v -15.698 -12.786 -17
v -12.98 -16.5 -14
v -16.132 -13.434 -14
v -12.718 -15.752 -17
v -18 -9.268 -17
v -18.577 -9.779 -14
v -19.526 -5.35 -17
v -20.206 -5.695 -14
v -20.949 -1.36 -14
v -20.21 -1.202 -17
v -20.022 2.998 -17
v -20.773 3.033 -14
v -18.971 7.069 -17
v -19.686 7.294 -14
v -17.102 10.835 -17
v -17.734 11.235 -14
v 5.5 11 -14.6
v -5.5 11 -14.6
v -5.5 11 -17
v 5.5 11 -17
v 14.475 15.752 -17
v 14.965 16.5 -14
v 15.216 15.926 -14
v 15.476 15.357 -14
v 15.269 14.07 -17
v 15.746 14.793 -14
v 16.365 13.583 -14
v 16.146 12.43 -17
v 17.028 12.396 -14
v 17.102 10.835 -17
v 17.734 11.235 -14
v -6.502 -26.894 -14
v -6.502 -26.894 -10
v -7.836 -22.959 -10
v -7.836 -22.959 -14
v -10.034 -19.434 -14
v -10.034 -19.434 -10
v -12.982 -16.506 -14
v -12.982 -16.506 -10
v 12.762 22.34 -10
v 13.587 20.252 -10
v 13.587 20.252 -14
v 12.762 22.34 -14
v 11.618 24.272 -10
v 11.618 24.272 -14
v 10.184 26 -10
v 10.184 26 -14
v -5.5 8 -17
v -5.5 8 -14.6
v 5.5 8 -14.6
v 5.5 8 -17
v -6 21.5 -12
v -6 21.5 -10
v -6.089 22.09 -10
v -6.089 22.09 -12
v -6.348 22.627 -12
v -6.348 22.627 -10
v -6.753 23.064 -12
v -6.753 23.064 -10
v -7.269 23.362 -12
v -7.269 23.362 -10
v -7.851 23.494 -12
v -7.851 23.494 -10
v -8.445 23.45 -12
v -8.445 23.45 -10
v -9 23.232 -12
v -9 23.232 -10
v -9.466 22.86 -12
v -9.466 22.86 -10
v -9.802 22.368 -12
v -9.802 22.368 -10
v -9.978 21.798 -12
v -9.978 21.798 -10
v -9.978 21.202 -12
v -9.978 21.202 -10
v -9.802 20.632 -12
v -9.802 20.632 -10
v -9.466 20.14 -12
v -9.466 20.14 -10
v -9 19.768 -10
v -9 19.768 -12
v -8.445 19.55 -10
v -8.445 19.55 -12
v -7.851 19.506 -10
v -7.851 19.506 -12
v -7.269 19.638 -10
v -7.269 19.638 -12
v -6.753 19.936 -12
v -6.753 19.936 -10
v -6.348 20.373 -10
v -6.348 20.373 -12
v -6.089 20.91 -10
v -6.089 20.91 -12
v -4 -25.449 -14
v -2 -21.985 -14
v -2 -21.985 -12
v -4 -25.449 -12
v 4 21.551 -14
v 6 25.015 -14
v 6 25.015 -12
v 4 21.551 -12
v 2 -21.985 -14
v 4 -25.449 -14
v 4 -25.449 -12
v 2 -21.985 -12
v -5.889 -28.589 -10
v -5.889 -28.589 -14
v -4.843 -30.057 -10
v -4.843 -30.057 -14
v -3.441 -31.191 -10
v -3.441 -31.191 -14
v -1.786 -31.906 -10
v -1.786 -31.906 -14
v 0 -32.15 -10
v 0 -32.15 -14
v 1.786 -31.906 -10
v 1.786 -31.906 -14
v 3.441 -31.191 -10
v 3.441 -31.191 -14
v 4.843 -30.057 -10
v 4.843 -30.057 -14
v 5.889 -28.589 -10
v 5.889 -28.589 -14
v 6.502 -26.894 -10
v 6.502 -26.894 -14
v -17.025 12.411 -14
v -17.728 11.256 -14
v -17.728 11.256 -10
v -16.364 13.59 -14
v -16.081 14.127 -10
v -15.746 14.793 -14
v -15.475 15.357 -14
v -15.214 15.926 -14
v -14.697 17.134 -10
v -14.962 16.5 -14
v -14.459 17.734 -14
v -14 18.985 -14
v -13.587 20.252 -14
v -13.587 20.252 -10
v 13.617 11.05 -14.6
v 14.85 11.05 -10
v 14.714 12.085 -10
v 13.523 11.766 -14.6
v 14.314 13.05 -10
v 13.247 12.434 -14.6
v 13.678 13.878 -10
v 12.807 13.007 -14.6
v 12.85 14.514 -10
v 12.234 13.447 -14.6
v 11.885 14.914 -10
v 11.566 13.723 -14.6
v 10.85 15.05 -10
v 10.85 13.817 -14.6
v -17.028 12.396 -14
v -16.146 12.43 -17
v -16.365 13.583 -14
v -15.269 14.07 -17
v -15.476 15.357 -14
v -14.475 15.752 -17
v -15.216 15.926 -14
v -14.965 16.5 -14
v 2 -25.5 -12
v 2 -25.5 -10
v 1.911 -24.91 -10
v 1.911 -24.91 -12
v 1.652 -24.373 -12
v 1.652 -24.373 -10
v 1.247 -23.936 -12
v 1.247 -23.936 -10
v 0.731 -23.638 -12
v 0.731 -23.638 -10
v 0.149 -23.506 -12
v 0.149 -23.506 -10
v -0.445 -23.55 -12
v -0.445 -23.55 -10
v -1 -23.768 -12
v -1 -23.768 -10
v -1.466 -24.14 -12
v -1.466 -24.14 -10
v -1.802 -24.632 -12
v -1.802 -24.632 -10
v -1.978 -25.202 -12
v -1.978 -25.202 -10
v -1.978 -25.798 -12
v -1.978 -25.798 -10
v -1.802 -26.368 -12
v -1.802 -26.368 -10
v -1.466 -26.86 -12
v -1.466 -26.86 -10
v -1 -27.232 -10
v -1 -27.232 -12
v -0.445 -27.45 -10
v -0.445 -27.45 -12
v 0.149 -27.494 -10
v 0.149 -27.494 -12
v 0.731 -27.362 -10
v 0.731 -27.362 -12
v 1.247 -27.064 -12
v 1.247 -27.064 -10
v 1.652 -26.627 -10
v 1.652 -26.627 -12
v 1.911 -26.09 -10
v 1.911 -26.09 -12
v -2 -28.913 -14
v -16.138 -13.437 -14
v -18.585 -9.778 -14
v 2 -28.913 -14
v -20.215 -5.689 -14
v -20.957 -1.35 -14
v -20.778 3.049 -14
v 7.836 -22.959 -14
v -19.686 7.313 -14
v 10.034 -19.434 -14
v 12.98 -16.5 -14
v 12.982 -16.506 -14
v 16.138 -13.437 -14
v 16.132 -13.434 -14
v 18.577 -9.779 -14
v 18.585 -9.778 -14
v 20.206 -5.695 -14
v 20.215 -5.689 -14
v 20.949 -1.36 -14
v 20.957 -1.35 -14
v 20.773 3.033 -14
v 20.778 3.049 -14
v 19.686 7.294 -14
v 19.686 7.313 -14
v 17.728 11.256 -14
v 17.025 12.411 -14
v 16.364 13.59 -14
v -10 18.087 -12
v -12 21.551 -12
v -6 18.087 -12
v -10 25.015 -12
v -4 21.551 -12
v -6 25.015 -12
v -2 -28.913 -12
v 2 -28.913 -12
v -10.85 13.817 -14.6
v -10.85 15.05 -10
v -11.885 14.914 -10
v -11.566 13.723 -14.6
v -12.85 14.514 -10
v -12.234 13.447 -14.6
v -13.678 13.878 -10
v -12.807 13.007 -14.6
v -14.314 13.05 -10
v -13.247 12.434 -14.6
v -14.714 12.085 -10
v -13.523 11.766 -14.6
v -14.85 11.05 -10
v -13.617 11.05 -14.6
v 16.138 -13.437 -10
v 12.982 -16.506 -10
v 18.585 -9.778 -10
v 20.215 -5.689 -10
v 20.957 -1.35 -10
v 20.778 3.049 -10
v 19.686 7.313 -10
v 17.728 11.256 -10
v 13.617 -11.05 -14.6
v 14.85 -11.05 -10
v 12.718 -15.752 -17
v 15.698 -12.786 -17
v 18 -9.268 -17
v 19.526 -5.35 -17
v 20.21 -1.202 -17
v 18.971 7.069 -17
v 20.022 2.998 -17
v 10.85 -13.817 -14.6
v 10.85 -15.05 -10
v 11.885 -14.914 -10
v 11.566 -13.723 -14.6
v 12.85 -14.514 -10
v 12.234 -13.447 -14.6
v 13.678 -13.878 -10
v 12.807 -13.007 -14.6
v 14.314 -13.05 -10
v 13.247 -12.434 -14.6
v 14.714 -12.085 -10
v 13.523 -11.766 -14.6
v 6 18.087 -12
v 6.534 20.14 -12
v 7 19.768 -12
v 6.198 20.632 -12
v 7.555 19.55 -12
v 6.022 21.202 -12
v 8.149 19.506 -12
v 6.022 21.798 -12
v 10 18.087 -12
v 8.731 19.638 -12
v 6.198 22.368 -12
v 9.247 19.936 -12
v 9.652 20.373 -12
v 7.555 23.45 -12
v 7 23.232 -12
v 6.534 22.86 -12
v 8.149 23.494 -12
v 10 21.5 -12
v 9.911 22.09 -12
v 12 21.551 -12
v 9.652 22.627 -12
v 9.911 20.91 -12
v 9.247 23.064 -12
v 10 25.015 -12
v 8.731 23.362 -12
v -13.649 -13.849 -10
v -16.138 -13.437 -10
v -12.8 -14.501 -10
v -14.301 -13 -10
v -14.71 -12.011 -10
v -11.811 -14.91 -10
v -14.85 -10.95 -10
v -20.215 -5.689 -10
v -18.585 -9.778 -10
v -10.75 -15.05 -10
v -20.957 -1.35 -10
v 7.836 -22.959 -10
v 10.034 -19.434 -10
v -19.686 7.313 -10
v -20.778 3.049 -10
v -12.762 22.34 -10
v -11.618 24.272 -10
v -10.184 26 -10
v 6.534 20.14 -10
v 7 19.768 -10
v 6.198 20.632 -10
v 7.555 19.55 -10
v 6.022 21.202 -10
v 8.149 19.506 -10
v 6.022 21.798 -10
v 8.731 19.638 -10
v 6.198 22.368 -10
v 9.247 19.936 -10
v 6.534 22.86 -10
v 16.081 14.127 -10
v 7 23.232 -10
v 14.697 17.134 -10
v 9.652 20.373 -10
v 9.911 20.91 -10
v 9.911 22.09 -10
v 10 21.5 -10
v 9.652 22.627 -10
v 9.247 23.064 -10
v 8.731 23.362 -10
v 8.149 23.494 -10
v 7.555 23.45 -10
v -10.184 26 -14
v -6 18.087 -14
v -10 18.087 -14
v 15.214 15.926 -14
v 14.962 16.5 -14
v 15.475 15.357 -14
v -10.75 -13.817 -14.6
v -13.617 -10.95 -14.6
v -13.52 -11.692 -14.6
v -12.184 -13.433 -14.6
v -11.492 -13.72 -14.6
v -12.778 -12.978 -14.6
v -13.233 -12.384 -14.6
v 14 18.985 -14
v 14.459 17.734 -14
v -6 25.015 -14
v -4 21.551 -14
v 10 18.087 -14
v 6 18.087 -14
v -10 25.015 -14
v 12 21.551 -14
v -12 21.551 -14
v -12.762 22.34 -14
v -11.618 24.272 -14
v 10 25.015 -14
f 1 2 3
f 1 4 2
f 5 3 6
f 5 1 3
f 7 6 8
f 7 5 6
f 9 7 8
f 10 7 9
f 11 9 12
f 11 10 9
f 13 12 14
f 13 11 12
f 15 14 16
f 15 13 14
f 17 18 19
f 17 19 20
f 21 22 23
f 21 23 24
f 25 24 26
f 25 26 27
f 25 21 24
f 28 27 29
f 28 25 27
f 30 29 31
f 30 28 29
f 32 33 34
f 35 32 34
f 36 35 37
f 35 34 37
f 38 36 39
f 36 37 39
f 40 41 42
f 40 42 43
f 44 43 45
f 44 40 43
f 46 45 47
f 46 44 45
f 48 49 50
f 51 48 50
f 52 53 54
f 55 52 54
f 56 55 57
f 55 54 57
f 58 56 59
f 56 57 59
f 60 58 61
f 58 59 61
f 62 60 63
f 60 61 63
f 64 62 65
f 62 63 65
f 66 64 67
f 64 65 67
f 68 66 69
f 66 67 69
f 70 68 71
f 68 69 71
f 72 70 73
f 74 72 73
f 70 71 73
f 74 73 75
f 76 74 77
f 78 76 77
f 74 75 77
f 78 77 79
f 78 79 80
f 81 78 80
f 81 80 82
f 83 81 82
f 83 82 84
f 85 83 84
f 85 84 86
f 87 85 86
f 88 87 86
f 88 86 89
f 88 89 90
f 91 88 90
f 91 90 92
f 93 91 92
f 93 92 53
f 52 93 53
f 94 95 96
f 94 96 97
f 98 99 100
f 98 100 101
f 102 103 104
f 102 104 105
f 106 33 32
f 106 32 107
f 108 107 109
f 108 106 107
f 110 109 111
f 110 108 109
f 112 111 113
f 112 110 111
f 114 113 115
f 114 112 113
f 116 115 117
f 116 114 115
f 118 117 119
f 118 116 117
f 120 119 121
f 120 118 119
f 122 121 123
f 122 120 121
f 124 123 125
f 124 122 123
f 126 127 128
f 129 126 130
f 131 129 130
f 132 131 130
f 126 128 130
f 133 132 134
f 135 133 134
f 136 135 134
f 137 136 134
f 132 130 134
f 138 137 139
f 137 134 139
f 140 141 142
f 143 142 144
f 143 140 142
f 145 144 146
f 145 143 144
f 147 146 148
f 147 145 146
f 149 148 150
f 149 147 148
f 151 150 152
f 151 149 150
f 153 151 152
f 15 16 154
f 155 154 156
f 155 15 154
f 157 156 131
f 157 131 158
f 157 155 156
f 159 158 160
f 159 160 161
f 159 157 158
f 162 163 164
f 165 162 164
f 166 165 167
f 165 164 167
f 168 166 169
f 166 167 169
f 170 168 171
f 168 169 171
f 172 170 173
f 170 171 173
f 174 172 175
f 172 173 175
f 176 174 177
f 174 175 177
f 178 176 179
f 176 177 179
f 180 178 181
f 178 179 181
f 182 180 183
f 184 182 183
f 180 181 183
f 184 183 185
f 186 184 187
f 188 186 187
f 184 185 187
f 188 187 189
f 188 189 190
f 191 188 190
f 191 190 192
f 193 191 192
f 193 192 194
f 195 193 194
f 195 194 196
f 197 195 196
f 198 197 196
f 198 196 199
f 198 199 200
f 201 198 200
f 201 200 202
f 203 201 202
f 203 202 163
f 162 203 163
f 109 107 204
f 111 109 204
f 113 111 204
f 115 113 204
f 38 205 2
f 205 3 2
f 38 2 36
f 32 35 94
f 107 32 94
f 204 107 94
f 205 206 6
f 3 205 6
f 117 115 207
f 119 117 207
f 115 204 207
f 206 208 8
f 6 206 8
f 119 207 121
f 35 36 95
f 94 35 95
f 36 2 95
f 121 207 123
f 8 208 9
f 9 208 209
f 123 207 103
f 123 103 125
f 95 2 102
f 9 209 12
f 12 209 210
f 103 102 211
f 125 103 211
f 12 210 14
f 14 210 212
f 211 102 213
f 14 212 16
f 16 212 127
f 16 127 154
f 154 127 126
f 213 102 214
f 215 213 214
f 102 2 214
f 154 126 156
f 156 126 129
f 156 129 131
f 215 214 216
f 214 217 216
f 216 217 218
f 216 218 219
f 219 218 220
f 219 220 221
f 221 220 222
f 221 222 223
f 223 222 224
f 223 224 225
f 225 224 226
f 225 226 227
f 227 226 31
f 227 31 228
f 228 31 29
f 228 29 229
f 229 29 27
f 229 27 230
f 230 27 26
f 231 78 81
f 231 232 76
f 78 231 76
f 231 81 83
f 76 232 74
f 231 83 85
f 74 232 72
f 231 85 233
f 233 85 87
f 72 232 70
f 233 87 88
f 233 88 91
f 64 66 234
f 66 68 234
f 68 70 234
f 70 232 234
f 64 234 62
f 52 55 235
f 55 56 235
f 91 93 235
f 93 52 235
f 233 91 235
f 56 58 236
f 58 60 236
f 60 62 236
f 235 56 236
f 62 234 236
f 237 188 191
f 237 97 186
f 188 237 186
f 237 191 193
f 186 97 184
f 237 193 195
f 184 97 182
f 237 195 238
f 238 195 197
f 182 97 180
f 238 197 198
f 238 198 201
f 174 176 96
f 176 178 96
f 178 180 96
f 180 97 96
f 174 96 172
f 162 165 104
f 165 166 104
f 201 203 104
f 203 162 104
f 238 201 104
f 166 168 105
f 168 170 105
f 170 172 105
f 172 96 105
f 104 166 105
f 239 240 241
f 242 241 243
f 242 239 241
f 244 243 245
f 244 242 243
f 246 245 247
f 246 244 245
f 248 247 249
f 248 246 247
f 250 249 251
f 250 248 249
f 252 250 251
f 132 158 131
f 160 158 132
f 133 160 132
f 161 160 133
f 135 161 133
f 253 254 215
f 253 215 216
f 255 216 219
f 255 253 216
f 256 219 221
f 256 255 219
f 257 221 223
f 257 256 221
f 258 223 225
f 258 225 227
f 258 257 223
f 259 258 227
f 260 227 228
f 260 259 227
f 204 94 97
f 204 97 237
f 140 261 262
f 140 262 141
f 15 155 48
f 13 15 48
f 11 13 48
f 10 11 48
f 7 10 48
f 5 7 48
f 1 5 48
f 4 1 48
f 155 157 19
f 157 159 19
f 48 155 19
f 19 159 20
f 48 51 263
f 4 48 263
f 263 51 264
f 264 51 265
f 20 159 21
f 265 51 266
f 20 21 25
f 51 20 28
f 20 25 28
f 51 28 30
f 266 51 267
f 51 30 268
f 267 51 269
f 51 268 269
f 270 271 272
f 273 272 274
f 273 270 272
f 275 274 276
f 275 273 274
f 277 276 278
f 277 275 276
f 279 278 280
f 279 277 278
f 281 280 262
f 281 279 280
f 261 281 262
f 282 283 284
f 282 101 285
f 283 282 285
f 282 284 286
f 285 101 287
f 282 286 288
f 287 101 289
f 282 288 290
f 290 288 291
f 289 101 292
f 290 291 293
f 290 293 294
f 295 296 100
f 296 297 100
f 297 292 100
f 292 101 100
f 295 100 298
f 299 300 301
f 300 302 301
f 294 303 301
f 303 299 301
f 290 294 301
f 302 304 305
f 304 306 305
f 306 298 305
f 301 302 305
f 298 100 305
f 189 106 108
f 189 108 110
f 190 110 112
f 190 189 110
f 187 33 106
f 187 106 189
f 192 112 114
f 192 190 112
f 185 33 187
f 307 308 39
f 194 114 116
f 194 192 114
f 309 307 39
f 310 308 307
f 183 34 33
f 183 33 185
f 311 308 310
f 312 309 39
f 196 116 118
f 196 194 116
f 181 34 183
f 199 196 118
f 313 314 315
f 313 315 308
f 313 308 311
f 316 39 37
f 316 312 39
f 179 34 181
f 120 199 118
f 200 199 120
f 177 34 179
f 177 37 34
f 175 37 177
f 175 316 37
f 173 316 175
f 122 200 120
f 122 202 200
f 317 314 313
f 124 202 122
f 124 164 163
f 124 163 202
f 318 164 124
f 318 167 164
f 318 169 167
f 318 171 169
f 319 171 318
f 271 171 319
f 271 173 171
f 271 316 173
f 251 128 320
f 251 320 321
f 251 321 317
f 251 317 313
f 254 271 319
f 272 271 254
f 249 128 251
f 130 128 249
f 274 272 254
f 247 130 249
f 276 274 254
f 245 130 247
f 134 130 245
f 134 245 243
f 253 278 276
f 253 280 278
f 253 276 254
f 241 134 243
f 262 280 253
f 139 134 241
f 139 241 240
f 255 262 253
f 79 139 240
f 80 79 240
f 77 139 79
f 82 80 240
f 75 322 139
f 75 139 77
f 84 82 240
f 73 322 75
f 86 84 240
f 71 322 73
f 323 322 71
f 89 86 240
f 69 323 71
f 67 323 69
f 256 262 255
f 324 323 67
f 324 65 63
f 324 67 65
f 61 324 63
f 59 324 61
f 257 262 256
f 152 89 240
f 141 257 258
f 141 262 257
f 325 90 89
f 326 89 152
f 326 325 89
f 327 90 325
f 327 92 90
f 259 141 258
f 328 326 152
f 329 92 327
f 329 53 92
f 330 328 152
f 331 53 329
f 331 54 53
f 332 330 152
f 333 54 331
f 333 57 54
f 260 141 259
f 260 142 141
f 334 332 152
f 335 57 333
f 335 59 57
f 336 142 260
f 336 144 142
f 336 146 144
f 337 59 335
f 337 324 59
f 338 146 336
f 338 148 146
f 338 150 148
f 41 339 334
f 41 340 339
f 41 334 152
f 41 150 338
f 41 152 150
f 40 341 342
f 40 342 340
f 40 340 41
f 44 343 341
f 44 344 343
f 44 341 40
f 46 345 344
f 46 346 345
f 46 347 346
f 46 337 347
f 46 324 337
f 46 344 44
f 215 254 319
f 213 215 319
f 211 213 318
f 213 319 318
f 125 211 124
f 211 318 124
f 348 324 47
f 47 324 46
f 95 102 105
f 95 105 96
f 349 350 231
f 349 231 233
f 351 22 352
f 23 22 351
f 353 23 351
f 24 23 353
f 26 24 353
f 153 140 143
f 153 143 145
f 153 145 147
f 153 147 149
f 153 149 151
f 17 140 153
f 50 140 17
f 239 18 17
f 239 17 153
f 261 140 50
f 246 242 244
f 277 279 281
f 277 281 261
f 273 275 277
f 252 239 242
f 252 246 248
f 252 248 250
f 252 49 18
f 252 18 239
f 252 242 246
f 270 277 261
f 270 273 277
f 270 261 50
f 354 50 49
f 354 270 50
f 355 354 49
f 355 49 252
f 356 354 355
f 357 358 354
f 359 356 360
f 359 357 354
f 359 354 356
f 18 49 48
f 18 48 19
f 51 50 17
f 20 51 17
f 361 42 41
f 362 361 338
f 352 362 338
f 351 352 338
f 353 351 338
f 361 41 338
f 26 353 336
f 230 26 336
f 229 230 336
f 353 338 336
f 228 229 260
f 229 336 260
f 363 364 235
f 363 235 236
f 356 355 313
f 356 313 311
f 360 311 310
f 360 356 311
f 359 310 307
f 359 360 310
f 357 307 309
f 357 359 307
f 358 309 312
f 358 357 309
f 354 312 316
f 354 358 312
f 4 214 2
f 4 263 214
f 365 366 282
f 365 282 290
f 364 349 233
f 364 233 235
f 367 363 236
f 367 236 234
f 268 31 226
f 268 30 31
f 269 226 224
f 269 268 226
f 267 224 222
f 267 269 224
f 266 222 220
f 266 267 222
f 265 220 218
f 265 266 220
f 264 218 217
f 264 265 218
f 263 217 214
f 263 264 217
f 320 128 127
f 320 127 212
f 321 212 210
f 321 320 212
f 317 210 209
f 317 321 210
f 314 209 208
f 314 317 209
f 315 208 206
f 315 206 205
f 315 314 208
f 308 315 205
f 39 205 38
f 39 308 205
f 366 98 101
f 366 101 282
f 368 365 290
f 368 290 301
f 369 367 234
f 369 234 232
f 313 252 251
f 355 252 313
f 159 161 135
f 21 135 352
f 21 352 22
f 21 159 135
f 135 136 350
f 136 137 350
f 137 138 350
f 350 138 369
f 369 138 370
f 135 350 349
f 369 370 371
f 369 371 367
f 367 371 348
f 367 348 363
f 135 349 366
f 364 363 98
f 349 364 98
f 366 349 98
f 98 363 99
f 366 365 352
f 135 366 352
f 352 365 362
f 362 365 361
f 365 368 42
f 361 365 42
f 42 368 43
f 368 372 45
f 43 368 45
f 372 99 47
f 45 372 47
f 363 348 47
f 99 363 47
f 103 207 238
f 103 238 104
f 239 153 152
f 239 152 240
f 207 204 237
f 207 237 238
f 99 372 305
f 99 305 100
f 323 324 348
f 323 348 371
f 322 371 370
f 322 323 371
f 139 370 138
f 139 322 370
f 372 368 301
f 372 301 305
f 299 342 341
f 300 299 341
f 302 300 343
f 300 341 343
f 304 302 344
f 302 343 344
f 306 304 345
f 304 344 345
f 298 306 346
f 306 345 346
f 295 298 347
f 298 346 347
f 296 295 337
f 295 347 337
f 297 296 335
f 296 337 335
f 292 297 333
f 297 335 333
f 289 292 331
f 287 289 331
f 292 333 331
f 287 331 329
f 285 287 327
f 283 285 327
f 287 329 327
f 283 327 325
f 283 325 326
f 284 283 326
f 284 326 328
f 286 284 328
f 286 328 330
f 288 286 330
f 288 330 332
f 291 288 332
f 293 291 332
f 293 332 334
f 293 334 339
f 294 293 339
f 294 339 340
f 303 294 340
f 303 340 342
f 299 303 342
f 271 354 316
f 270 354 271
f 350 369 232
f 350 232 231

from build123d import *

# Parameters (mm, degrees)
PAD033_DEPTH    = 3
PAD033_TAPER    = 14
SKETCH057_R     = 2
PAD034_DEPTH    = 4
POCKET008_DEPTH = 4.6
POCKET008_TAPER = 15
POCKET009_DEPTH = 2
SKETCH056_W     = 11
SKETCH056_H     = 3
POCKET010_DEPTH = 5


with BuildPart() as part:
    # Sketch055 → Pad033 (new body)
    with BuildSketch(Plane.XY.offset(-4)):
        with BuildLine():
            ThreePointArc((-17.734351, 11.23491), (-16.243686, 13.811706), (-14.965, 16.5))
            Line((-14.965, 16.5), (14.965, 16.5))
            ThreePointArc((14.965, 16.5), (16.243686, 13.811706), (17.734351, 11.23491))
            ThreePointArc((12.98, -16.5), (20.691765, -3.547007), (17.734351, 11.23491))
            Line((-12.98, -16.5), (12.98, -16.5))
            ThreePointArc((-17.734351, 11.23491), (-20.691765, -3.547007), (-12.98, -16.5))
        make_face()
    extrude(amount=-PAD033_DEPTH, taper=PAD033_TAPER)

    # Sketch057 → Pad034 (join)
    with BuildSketch(Plane.XY):
        with BuildLine():
            ThreePointArc((13.586881, 20.251823), (12.228055, 23.328699), (10.184105, 26))
            Line((-10.184105, 26), (10.184105, 26))
            ThreePointArc((-10.184105, 26), (-12.228055, 23.328699), (-13.586881, 20.251823))
            ThreePointArc((-17.728491, 11.256137), (-15.355357, 15.614788), (-13.586881, 20.251823))
            ThreePointArc((-17.728491, 11.256137), (-20.699674, -3.538854), (-12.982142, -16.506483))
            ThreePointArc((-6.502297, -26.893782), (-8.833051, -21.132971), (-12.982142, -16.506483))
            ThreePointArc((-6.502297, -26.893782), (0, -32.15), (6.502297, -26.893782))
            ThreePointArc((12.982142, -16.506483), (8.833051, -21.132971), (6.502297, -26.893782))
            ThreePointArc((12.982142, -16.506483), (20.699674, -3.538854), (17.728491, 11.256137))
            ThreePointArc((13.586881, 20.251823), (15.355357, 15.614788), (17.728491, 11.256137))
        make_face()
        with Locations((0, -25.5)):
            Circle(SKETCH057_R, mode=Mode.SUBTRACT)
        with Locations((-8, 21.5)):
            Circle(SKETCH057_R, mode=Mode.SUBTRACT)
        with Locations((8, 21.5)):
            Circle(SKETCH057_R, mode=Mode.SUBTRACT)
    extrude(amount=-PAD034_DEPTH)

    # Sketch058 → Pocket008 (cut)
    with BuildSketch(Plane.XY):
        with BuildLine():
            Line((-14.85, 11.05), (-14.85, -10.95))
            ThreePointArc((-14.85, -10.95), (-13.649138, -13.849138), (-10.75, -15.05))
            Line((-10.75, -15.05), (10.85, -15.05))
            ThreePointArc((10.85, -15.05), (13.678427, -13.878427), (14.85, -11.05))
            Line((14.85, -11.05), (14.85, 11.05))
            ThreePointArc((14.85, 11.05), (13.678427, 13.878427), (10.85, 15.05))
            Line((10.85, 15.05), (-10.85, 15.05))
            ThreePointArc((-10.85, 15.05), (-13.678427, 13.878427), (-14.85, 11.05))
        make_face()
    extrude(amount=-POCKET008_DEPTH, taper=POCKET008_TAPER, mode=Mode.SUBTRACT)

    # Sketch025 (on Face20 of Pocket008) → Pocket009 (cut)
    with BuildSketch(Plane(origin=(0, -3.3492, -4), x_dir=(1, 0, 0), z_dir=(0, 0, 1))):
        Polygon((12, 24.9), (10, 28.364102), (6, 28.364102), (4, 24.9), (6, 21.435898), (10, 21.435898), align=None)
        Polygon((-4, 24.9), (-6, 28.364102), (-10, 28.364102), (-12, 24.9), (-10, 21.435898), (-6, 21.435898), align=None)
        Polygon((4, -22.1), (2, -18.635898), (-2, -18.635898), (-4, -22.1), (-2, -25.564102), (2, -25.564102), align=None)
    extrude(amount=POCKET009_DEPTH, mode=Mode.SUBTRACT)

    # Sketch056 → Pocket010 (cut)
    with BuildSketch(Plane.XY.offset(-4)):
        with Locations((0, 9.5)):
            Rectangle(SKETCH056_W, SKETCH056_H)
    extrude(amount=-POCKET010_DEPTH, mode=Mode.SUBTRACT)


with BuildPart() as part_1:
    # Body016 placement: moved
    add(part.part.moved(Location((0, 0, -10))))


solid = part_1.part
